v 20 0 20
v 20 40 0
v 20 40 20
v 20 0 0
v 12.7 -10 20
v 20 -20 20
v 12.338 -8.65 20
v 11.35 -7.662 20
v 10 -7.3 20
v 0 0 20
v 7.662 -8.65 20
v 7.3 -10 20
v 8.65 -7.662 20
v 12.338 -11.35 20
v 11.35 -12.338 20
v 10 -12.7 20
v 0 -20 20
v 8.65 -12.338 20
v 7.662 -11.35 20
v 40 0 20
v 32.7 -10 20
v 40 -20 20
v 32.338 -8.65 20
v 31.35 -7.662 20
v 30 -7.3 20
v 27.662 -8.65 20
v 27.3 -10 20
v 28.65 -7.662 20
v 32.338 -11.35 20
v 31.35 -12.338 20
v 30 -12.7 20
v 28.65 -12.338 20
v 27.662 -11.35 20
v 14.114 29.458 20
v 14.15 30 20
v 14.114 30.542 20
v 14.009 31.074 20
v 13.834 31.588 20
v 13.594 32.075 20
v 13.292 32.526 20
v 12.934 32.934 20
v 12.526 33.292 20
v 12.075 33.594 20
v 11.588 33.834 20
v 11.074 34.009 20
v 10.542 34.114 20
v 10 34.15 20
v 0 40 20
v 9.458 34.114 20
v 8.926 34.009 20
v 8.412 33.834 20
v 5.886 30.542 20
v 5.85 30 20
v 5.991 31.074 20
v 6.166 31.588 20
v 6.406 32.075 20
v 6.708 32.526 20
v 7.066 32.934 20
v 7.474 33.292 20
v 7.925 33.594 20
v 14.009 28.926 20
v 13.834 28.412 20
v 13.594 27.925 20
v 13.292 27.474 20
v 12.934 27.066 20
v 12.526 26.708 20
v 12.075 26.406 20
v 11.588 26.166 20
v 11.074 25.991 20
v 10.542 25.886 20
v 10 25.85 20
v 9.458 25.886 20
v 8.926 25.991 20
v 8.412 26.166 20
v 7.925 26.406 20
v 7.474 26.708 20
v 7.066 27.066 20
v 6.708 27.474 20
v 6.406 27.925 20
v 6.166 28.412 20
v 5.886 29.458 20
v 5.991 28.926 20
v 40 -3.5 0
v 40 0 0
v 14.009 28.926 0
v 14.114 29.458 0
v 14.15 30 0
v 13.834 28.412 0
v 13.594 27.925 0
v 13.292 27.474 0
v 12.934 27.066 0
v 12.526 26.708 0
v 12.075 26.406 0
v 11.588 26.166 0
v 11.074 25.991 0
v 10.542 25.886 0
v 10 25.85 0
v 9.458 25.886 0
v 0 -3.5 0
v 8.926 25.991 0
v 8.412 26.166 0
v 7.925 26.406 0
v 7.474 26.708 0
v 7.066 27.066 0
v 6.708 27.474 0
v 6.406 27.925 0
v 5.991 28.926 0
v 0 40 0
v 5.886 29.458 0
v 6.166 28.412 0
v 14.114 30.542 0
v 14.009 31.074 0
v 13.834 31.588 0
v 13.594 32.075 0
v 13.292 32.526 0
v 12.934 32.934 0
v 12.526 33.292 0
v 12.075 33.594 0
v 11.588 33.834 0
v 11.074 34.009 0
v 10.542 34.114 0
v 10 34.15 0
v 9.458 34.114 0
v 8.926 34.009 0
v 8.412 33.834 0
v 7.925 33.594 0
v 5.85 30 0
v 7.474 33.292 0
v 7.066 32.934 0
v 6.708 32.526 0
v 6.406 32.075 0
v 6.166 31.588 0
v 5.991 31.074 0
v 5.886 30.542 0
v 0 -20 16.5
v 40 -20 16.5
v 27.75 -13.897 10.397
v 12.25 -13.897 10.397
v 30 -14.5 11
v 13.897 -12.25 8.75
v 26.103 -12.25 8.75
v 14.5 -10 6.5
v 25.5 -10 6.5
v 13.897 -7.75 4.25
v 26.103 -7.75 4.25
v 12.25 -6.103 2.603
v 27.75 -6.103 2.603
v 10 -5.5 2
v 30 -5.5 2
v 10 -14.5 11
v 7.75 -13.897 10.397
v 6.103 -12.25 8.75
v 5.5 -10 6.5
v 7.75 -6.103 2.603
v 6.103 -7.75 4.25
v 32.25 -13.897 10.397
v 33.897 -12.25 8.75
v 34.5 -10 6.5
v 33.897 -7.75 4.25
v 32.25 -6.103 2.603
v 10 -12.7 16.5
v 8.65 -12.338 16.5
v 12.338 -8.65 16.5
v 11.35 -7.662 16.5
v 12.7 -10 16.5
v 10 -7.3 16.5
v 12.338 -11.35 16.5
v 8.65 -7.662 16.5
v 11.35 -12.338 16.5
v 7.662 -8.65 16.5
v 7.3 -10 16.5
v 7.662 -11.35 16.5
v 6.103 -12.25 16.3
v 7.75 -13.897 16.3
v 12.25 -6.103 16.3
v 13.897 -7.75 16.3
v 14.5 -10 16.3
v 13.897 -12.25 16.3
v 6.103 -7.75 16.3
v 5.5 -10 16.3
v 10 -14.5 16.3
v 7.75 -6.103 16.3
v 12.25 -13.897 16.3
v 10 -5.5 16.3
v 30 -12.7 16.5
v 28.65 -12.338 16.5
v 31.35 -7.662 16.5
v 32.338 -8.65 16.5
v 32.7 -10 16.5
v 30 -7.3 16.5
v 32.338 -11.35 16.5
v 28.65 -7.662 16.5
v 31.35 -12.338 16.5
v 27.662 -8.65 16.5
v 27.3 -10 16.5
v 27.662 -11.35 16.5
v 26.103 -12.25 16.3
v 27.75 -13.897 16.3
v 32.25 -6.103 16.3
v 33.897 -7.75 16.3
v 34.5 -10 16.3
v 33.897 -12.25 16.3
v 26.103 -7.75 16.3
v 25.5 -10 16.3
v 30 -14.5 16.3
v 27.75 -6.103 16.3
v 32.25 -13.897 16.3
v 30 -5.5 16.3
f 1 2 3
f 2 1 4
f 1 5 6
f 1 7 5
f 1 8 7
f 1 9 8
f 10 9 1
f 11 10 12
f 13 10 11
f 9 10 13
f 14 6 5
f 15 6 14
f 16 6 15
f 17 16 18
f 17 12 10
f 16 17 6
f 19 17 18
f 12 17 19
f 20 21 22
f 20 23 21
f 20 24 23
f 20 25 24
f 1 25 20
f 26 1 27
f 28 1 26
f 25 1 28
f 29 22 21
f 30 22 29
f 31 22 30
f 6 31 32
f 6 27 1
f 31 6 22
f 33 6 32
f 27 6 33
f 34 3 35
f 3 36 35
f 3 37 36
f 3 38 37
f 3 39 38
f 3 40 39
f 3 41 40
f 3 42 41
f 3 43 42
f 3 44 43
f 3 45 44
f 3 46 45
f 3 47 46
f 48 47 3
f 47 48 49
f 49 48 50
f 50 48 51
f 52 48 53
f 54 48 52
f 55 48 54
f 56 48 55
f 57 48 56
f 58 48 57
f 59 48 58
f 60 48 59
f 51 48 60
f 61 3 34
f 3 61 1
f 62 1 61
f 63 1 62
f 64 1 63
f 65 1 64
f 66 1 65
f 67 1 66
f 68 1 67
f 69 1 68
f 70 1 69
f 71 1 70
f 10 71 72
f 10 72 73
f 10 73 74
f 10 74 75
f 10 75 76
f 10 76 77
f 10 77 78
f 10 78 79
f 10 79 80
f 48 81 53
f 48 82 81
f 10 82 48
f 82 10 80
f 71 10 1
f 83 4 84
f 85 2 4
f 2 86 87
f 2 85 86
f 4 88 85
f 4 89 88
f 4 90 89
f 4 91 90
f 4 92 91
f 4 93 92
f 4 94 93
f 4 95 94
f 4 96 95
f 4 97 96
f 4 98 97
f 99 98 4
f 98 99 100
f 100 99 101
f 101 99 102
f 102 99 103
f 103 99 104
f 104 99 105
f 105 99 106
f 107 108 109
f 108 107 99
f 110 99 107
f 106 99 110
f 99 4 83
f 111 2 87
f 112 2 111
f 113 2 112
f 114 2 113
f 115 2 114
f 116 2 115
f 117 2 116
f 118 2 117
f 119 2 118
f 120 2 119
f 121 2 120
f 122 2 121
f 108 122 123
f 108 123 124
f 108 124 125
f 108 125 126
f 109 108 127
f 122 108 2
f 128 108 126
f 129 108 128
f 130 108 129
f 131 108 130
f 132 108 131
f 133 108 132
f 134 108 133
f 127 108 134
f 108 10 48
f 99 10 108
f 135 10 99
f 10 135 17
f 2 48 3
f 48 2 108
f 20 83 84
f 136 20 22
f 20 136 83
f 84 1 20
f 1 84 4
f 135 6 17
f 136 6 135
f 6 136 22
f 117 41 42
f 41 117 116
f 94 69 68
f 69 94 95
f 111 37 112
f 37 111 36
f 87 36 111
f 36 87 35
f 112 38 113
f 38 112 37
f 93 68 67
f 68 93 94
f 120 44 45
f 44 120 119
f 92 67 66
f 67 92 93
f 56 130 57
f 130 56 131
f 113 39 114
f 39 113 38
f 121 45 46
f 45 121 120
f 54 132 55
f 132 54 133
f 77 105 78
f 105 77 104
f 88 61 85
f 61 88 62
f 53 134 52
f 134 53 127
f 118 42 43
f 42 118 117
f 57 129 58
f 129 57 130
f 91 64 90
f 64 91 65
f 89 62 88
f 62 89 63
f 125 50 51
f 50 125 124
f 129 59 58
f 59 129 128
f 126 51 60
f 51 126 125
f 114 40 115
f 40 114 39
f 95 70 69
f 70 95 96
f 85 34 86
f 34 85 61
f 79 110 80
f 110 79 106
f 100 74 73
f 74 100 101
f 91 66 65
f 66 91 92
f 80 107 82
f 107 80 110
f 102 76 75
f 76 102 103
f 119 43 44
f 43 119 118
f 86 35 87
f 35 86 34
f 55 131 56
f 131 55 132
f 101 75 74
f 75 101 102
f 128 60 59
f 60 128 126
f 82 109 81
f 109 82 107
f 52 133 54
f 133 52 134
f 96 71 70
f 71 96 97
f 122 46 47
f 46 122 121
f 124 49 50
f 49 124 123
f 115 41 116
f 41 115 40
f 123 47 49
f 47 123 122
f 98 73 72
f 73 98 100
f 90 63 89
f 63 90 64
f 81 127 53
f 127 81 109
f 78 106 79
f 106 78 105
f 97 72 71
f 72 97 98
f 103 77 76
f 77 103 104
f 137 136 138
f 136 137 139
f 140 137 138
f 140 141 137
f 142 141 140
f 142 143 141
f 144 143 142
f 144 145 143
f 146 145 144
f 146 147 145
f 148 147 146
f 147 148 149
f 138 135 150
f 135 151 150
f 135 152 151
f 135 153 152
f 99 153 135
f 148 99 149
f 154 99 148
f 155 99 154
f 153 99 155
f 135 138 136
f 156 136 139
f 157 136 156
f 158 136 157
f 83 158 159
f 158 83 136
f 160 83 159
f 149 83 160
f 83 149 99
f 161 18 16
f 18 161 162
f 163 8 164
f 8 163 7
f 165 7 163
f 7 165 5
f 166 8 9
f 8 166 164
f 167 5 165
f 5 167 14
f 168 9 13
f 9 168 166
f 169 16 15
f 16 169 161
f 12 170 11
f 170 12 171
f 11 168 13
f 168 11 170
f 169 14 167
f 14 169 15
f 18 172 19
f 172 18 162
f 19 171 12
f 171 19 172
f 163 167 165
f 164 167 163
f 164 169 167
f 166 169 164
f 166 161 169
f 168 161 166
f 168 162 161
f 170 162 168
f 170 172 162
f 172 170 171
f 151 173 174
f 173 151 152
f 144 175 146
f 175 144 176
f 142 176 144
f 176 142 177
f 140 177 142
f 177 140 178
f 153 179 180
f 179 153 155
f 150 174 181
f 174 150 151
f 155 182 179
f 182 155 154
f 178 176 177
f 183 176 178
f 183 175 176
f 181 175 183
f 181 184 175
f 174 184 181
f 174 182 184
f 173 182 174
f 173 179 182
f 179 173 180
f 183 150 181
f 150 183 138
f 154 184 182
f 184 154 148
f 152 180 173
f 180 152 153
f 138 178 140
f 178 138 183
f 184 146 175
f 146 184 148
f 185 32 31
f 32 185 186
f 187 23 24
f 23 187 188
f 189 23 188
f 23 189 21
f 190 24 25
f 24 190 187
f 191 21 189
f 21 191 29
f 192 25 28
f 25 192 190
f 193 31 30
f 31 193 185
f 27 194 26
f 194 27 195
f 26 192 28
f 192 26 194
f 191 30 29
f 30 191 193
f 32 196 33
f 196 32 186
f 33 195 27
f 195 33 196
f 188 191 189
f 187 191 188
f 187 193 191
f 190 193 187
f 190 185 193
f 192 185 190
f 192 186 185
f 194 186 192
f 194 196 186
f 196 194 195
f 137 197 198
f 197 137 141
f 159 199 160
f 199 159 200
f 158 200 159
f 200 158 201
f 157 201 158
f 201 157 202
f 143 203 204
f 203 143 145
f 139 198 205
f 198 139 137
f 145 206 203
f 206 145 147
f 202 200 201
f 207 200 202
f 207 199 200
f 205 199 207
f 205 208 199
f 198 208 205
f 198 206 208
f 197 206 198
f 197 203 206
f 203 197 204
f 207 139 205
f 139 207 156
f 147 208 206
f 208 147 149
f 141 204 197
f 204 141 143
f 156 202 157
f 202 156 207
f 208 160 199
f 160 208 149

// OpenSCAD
t=3.5;

difference()
{
    union()
    {
        cube([20,40,20]);
        
        translate([20,-20,0])
            cube([20,20,20]);
        
        translate([0,-20,0])
            cube([20,20,20]);
        
        //translate([-10,0,25])
        //    cube([40,t,15]);
        
        /*translate([-10,0,25])
            rotate([0,45,0])
                cube([40/sqrt(2),t,40/sqrt(2)]);*/
        
        //rotate([45,0,0])
           // cube([20,20*sqrt(2),20*sqrt(2)]);
    }
    union()
    {
        translate([0,-20,20])
            cube([20,20,20]);
        
        translate([0,0,40])
            cube([20,20,20]);
        
        translate([10,10+20,0])
            cylinder(d=8.3,h=40,$fn=48);
        
        /*translate([0,20,20+t])
            rotate([45,0,0])
                cube([20,20*sqrt(2),20*sqrt(2)]);*/
        
        translate([0,-20,-20-t])
            rotate([45,0,0])
                cube([40,20*sqrt(2),20*sqrt(2)]);
        
        translate([10,-10,20-t])
            cylinder(d=5.4,h=t,$fn=12);
        translate([10,-10,0])
            cylinder(d=9,h=20-t-0.2,$fn=12);
            
        translate([10+20,-10,20-t])
            cylinder(d=5.4,h=t,$fn=12);
        translate([10+20,-10,0])
            cylinder(d=9,h=20-t-0.2,$fn=12);
        
        translate([-5,0,30])
            rotate([270,0,0])
                cylinder(d=5.4,h=t+1,$fn=12);
        translate([20+5,0,30])
            rotate([270,0,0])
                cylinder(d=5.4,h=t+1,$fn=12);
    }
}
